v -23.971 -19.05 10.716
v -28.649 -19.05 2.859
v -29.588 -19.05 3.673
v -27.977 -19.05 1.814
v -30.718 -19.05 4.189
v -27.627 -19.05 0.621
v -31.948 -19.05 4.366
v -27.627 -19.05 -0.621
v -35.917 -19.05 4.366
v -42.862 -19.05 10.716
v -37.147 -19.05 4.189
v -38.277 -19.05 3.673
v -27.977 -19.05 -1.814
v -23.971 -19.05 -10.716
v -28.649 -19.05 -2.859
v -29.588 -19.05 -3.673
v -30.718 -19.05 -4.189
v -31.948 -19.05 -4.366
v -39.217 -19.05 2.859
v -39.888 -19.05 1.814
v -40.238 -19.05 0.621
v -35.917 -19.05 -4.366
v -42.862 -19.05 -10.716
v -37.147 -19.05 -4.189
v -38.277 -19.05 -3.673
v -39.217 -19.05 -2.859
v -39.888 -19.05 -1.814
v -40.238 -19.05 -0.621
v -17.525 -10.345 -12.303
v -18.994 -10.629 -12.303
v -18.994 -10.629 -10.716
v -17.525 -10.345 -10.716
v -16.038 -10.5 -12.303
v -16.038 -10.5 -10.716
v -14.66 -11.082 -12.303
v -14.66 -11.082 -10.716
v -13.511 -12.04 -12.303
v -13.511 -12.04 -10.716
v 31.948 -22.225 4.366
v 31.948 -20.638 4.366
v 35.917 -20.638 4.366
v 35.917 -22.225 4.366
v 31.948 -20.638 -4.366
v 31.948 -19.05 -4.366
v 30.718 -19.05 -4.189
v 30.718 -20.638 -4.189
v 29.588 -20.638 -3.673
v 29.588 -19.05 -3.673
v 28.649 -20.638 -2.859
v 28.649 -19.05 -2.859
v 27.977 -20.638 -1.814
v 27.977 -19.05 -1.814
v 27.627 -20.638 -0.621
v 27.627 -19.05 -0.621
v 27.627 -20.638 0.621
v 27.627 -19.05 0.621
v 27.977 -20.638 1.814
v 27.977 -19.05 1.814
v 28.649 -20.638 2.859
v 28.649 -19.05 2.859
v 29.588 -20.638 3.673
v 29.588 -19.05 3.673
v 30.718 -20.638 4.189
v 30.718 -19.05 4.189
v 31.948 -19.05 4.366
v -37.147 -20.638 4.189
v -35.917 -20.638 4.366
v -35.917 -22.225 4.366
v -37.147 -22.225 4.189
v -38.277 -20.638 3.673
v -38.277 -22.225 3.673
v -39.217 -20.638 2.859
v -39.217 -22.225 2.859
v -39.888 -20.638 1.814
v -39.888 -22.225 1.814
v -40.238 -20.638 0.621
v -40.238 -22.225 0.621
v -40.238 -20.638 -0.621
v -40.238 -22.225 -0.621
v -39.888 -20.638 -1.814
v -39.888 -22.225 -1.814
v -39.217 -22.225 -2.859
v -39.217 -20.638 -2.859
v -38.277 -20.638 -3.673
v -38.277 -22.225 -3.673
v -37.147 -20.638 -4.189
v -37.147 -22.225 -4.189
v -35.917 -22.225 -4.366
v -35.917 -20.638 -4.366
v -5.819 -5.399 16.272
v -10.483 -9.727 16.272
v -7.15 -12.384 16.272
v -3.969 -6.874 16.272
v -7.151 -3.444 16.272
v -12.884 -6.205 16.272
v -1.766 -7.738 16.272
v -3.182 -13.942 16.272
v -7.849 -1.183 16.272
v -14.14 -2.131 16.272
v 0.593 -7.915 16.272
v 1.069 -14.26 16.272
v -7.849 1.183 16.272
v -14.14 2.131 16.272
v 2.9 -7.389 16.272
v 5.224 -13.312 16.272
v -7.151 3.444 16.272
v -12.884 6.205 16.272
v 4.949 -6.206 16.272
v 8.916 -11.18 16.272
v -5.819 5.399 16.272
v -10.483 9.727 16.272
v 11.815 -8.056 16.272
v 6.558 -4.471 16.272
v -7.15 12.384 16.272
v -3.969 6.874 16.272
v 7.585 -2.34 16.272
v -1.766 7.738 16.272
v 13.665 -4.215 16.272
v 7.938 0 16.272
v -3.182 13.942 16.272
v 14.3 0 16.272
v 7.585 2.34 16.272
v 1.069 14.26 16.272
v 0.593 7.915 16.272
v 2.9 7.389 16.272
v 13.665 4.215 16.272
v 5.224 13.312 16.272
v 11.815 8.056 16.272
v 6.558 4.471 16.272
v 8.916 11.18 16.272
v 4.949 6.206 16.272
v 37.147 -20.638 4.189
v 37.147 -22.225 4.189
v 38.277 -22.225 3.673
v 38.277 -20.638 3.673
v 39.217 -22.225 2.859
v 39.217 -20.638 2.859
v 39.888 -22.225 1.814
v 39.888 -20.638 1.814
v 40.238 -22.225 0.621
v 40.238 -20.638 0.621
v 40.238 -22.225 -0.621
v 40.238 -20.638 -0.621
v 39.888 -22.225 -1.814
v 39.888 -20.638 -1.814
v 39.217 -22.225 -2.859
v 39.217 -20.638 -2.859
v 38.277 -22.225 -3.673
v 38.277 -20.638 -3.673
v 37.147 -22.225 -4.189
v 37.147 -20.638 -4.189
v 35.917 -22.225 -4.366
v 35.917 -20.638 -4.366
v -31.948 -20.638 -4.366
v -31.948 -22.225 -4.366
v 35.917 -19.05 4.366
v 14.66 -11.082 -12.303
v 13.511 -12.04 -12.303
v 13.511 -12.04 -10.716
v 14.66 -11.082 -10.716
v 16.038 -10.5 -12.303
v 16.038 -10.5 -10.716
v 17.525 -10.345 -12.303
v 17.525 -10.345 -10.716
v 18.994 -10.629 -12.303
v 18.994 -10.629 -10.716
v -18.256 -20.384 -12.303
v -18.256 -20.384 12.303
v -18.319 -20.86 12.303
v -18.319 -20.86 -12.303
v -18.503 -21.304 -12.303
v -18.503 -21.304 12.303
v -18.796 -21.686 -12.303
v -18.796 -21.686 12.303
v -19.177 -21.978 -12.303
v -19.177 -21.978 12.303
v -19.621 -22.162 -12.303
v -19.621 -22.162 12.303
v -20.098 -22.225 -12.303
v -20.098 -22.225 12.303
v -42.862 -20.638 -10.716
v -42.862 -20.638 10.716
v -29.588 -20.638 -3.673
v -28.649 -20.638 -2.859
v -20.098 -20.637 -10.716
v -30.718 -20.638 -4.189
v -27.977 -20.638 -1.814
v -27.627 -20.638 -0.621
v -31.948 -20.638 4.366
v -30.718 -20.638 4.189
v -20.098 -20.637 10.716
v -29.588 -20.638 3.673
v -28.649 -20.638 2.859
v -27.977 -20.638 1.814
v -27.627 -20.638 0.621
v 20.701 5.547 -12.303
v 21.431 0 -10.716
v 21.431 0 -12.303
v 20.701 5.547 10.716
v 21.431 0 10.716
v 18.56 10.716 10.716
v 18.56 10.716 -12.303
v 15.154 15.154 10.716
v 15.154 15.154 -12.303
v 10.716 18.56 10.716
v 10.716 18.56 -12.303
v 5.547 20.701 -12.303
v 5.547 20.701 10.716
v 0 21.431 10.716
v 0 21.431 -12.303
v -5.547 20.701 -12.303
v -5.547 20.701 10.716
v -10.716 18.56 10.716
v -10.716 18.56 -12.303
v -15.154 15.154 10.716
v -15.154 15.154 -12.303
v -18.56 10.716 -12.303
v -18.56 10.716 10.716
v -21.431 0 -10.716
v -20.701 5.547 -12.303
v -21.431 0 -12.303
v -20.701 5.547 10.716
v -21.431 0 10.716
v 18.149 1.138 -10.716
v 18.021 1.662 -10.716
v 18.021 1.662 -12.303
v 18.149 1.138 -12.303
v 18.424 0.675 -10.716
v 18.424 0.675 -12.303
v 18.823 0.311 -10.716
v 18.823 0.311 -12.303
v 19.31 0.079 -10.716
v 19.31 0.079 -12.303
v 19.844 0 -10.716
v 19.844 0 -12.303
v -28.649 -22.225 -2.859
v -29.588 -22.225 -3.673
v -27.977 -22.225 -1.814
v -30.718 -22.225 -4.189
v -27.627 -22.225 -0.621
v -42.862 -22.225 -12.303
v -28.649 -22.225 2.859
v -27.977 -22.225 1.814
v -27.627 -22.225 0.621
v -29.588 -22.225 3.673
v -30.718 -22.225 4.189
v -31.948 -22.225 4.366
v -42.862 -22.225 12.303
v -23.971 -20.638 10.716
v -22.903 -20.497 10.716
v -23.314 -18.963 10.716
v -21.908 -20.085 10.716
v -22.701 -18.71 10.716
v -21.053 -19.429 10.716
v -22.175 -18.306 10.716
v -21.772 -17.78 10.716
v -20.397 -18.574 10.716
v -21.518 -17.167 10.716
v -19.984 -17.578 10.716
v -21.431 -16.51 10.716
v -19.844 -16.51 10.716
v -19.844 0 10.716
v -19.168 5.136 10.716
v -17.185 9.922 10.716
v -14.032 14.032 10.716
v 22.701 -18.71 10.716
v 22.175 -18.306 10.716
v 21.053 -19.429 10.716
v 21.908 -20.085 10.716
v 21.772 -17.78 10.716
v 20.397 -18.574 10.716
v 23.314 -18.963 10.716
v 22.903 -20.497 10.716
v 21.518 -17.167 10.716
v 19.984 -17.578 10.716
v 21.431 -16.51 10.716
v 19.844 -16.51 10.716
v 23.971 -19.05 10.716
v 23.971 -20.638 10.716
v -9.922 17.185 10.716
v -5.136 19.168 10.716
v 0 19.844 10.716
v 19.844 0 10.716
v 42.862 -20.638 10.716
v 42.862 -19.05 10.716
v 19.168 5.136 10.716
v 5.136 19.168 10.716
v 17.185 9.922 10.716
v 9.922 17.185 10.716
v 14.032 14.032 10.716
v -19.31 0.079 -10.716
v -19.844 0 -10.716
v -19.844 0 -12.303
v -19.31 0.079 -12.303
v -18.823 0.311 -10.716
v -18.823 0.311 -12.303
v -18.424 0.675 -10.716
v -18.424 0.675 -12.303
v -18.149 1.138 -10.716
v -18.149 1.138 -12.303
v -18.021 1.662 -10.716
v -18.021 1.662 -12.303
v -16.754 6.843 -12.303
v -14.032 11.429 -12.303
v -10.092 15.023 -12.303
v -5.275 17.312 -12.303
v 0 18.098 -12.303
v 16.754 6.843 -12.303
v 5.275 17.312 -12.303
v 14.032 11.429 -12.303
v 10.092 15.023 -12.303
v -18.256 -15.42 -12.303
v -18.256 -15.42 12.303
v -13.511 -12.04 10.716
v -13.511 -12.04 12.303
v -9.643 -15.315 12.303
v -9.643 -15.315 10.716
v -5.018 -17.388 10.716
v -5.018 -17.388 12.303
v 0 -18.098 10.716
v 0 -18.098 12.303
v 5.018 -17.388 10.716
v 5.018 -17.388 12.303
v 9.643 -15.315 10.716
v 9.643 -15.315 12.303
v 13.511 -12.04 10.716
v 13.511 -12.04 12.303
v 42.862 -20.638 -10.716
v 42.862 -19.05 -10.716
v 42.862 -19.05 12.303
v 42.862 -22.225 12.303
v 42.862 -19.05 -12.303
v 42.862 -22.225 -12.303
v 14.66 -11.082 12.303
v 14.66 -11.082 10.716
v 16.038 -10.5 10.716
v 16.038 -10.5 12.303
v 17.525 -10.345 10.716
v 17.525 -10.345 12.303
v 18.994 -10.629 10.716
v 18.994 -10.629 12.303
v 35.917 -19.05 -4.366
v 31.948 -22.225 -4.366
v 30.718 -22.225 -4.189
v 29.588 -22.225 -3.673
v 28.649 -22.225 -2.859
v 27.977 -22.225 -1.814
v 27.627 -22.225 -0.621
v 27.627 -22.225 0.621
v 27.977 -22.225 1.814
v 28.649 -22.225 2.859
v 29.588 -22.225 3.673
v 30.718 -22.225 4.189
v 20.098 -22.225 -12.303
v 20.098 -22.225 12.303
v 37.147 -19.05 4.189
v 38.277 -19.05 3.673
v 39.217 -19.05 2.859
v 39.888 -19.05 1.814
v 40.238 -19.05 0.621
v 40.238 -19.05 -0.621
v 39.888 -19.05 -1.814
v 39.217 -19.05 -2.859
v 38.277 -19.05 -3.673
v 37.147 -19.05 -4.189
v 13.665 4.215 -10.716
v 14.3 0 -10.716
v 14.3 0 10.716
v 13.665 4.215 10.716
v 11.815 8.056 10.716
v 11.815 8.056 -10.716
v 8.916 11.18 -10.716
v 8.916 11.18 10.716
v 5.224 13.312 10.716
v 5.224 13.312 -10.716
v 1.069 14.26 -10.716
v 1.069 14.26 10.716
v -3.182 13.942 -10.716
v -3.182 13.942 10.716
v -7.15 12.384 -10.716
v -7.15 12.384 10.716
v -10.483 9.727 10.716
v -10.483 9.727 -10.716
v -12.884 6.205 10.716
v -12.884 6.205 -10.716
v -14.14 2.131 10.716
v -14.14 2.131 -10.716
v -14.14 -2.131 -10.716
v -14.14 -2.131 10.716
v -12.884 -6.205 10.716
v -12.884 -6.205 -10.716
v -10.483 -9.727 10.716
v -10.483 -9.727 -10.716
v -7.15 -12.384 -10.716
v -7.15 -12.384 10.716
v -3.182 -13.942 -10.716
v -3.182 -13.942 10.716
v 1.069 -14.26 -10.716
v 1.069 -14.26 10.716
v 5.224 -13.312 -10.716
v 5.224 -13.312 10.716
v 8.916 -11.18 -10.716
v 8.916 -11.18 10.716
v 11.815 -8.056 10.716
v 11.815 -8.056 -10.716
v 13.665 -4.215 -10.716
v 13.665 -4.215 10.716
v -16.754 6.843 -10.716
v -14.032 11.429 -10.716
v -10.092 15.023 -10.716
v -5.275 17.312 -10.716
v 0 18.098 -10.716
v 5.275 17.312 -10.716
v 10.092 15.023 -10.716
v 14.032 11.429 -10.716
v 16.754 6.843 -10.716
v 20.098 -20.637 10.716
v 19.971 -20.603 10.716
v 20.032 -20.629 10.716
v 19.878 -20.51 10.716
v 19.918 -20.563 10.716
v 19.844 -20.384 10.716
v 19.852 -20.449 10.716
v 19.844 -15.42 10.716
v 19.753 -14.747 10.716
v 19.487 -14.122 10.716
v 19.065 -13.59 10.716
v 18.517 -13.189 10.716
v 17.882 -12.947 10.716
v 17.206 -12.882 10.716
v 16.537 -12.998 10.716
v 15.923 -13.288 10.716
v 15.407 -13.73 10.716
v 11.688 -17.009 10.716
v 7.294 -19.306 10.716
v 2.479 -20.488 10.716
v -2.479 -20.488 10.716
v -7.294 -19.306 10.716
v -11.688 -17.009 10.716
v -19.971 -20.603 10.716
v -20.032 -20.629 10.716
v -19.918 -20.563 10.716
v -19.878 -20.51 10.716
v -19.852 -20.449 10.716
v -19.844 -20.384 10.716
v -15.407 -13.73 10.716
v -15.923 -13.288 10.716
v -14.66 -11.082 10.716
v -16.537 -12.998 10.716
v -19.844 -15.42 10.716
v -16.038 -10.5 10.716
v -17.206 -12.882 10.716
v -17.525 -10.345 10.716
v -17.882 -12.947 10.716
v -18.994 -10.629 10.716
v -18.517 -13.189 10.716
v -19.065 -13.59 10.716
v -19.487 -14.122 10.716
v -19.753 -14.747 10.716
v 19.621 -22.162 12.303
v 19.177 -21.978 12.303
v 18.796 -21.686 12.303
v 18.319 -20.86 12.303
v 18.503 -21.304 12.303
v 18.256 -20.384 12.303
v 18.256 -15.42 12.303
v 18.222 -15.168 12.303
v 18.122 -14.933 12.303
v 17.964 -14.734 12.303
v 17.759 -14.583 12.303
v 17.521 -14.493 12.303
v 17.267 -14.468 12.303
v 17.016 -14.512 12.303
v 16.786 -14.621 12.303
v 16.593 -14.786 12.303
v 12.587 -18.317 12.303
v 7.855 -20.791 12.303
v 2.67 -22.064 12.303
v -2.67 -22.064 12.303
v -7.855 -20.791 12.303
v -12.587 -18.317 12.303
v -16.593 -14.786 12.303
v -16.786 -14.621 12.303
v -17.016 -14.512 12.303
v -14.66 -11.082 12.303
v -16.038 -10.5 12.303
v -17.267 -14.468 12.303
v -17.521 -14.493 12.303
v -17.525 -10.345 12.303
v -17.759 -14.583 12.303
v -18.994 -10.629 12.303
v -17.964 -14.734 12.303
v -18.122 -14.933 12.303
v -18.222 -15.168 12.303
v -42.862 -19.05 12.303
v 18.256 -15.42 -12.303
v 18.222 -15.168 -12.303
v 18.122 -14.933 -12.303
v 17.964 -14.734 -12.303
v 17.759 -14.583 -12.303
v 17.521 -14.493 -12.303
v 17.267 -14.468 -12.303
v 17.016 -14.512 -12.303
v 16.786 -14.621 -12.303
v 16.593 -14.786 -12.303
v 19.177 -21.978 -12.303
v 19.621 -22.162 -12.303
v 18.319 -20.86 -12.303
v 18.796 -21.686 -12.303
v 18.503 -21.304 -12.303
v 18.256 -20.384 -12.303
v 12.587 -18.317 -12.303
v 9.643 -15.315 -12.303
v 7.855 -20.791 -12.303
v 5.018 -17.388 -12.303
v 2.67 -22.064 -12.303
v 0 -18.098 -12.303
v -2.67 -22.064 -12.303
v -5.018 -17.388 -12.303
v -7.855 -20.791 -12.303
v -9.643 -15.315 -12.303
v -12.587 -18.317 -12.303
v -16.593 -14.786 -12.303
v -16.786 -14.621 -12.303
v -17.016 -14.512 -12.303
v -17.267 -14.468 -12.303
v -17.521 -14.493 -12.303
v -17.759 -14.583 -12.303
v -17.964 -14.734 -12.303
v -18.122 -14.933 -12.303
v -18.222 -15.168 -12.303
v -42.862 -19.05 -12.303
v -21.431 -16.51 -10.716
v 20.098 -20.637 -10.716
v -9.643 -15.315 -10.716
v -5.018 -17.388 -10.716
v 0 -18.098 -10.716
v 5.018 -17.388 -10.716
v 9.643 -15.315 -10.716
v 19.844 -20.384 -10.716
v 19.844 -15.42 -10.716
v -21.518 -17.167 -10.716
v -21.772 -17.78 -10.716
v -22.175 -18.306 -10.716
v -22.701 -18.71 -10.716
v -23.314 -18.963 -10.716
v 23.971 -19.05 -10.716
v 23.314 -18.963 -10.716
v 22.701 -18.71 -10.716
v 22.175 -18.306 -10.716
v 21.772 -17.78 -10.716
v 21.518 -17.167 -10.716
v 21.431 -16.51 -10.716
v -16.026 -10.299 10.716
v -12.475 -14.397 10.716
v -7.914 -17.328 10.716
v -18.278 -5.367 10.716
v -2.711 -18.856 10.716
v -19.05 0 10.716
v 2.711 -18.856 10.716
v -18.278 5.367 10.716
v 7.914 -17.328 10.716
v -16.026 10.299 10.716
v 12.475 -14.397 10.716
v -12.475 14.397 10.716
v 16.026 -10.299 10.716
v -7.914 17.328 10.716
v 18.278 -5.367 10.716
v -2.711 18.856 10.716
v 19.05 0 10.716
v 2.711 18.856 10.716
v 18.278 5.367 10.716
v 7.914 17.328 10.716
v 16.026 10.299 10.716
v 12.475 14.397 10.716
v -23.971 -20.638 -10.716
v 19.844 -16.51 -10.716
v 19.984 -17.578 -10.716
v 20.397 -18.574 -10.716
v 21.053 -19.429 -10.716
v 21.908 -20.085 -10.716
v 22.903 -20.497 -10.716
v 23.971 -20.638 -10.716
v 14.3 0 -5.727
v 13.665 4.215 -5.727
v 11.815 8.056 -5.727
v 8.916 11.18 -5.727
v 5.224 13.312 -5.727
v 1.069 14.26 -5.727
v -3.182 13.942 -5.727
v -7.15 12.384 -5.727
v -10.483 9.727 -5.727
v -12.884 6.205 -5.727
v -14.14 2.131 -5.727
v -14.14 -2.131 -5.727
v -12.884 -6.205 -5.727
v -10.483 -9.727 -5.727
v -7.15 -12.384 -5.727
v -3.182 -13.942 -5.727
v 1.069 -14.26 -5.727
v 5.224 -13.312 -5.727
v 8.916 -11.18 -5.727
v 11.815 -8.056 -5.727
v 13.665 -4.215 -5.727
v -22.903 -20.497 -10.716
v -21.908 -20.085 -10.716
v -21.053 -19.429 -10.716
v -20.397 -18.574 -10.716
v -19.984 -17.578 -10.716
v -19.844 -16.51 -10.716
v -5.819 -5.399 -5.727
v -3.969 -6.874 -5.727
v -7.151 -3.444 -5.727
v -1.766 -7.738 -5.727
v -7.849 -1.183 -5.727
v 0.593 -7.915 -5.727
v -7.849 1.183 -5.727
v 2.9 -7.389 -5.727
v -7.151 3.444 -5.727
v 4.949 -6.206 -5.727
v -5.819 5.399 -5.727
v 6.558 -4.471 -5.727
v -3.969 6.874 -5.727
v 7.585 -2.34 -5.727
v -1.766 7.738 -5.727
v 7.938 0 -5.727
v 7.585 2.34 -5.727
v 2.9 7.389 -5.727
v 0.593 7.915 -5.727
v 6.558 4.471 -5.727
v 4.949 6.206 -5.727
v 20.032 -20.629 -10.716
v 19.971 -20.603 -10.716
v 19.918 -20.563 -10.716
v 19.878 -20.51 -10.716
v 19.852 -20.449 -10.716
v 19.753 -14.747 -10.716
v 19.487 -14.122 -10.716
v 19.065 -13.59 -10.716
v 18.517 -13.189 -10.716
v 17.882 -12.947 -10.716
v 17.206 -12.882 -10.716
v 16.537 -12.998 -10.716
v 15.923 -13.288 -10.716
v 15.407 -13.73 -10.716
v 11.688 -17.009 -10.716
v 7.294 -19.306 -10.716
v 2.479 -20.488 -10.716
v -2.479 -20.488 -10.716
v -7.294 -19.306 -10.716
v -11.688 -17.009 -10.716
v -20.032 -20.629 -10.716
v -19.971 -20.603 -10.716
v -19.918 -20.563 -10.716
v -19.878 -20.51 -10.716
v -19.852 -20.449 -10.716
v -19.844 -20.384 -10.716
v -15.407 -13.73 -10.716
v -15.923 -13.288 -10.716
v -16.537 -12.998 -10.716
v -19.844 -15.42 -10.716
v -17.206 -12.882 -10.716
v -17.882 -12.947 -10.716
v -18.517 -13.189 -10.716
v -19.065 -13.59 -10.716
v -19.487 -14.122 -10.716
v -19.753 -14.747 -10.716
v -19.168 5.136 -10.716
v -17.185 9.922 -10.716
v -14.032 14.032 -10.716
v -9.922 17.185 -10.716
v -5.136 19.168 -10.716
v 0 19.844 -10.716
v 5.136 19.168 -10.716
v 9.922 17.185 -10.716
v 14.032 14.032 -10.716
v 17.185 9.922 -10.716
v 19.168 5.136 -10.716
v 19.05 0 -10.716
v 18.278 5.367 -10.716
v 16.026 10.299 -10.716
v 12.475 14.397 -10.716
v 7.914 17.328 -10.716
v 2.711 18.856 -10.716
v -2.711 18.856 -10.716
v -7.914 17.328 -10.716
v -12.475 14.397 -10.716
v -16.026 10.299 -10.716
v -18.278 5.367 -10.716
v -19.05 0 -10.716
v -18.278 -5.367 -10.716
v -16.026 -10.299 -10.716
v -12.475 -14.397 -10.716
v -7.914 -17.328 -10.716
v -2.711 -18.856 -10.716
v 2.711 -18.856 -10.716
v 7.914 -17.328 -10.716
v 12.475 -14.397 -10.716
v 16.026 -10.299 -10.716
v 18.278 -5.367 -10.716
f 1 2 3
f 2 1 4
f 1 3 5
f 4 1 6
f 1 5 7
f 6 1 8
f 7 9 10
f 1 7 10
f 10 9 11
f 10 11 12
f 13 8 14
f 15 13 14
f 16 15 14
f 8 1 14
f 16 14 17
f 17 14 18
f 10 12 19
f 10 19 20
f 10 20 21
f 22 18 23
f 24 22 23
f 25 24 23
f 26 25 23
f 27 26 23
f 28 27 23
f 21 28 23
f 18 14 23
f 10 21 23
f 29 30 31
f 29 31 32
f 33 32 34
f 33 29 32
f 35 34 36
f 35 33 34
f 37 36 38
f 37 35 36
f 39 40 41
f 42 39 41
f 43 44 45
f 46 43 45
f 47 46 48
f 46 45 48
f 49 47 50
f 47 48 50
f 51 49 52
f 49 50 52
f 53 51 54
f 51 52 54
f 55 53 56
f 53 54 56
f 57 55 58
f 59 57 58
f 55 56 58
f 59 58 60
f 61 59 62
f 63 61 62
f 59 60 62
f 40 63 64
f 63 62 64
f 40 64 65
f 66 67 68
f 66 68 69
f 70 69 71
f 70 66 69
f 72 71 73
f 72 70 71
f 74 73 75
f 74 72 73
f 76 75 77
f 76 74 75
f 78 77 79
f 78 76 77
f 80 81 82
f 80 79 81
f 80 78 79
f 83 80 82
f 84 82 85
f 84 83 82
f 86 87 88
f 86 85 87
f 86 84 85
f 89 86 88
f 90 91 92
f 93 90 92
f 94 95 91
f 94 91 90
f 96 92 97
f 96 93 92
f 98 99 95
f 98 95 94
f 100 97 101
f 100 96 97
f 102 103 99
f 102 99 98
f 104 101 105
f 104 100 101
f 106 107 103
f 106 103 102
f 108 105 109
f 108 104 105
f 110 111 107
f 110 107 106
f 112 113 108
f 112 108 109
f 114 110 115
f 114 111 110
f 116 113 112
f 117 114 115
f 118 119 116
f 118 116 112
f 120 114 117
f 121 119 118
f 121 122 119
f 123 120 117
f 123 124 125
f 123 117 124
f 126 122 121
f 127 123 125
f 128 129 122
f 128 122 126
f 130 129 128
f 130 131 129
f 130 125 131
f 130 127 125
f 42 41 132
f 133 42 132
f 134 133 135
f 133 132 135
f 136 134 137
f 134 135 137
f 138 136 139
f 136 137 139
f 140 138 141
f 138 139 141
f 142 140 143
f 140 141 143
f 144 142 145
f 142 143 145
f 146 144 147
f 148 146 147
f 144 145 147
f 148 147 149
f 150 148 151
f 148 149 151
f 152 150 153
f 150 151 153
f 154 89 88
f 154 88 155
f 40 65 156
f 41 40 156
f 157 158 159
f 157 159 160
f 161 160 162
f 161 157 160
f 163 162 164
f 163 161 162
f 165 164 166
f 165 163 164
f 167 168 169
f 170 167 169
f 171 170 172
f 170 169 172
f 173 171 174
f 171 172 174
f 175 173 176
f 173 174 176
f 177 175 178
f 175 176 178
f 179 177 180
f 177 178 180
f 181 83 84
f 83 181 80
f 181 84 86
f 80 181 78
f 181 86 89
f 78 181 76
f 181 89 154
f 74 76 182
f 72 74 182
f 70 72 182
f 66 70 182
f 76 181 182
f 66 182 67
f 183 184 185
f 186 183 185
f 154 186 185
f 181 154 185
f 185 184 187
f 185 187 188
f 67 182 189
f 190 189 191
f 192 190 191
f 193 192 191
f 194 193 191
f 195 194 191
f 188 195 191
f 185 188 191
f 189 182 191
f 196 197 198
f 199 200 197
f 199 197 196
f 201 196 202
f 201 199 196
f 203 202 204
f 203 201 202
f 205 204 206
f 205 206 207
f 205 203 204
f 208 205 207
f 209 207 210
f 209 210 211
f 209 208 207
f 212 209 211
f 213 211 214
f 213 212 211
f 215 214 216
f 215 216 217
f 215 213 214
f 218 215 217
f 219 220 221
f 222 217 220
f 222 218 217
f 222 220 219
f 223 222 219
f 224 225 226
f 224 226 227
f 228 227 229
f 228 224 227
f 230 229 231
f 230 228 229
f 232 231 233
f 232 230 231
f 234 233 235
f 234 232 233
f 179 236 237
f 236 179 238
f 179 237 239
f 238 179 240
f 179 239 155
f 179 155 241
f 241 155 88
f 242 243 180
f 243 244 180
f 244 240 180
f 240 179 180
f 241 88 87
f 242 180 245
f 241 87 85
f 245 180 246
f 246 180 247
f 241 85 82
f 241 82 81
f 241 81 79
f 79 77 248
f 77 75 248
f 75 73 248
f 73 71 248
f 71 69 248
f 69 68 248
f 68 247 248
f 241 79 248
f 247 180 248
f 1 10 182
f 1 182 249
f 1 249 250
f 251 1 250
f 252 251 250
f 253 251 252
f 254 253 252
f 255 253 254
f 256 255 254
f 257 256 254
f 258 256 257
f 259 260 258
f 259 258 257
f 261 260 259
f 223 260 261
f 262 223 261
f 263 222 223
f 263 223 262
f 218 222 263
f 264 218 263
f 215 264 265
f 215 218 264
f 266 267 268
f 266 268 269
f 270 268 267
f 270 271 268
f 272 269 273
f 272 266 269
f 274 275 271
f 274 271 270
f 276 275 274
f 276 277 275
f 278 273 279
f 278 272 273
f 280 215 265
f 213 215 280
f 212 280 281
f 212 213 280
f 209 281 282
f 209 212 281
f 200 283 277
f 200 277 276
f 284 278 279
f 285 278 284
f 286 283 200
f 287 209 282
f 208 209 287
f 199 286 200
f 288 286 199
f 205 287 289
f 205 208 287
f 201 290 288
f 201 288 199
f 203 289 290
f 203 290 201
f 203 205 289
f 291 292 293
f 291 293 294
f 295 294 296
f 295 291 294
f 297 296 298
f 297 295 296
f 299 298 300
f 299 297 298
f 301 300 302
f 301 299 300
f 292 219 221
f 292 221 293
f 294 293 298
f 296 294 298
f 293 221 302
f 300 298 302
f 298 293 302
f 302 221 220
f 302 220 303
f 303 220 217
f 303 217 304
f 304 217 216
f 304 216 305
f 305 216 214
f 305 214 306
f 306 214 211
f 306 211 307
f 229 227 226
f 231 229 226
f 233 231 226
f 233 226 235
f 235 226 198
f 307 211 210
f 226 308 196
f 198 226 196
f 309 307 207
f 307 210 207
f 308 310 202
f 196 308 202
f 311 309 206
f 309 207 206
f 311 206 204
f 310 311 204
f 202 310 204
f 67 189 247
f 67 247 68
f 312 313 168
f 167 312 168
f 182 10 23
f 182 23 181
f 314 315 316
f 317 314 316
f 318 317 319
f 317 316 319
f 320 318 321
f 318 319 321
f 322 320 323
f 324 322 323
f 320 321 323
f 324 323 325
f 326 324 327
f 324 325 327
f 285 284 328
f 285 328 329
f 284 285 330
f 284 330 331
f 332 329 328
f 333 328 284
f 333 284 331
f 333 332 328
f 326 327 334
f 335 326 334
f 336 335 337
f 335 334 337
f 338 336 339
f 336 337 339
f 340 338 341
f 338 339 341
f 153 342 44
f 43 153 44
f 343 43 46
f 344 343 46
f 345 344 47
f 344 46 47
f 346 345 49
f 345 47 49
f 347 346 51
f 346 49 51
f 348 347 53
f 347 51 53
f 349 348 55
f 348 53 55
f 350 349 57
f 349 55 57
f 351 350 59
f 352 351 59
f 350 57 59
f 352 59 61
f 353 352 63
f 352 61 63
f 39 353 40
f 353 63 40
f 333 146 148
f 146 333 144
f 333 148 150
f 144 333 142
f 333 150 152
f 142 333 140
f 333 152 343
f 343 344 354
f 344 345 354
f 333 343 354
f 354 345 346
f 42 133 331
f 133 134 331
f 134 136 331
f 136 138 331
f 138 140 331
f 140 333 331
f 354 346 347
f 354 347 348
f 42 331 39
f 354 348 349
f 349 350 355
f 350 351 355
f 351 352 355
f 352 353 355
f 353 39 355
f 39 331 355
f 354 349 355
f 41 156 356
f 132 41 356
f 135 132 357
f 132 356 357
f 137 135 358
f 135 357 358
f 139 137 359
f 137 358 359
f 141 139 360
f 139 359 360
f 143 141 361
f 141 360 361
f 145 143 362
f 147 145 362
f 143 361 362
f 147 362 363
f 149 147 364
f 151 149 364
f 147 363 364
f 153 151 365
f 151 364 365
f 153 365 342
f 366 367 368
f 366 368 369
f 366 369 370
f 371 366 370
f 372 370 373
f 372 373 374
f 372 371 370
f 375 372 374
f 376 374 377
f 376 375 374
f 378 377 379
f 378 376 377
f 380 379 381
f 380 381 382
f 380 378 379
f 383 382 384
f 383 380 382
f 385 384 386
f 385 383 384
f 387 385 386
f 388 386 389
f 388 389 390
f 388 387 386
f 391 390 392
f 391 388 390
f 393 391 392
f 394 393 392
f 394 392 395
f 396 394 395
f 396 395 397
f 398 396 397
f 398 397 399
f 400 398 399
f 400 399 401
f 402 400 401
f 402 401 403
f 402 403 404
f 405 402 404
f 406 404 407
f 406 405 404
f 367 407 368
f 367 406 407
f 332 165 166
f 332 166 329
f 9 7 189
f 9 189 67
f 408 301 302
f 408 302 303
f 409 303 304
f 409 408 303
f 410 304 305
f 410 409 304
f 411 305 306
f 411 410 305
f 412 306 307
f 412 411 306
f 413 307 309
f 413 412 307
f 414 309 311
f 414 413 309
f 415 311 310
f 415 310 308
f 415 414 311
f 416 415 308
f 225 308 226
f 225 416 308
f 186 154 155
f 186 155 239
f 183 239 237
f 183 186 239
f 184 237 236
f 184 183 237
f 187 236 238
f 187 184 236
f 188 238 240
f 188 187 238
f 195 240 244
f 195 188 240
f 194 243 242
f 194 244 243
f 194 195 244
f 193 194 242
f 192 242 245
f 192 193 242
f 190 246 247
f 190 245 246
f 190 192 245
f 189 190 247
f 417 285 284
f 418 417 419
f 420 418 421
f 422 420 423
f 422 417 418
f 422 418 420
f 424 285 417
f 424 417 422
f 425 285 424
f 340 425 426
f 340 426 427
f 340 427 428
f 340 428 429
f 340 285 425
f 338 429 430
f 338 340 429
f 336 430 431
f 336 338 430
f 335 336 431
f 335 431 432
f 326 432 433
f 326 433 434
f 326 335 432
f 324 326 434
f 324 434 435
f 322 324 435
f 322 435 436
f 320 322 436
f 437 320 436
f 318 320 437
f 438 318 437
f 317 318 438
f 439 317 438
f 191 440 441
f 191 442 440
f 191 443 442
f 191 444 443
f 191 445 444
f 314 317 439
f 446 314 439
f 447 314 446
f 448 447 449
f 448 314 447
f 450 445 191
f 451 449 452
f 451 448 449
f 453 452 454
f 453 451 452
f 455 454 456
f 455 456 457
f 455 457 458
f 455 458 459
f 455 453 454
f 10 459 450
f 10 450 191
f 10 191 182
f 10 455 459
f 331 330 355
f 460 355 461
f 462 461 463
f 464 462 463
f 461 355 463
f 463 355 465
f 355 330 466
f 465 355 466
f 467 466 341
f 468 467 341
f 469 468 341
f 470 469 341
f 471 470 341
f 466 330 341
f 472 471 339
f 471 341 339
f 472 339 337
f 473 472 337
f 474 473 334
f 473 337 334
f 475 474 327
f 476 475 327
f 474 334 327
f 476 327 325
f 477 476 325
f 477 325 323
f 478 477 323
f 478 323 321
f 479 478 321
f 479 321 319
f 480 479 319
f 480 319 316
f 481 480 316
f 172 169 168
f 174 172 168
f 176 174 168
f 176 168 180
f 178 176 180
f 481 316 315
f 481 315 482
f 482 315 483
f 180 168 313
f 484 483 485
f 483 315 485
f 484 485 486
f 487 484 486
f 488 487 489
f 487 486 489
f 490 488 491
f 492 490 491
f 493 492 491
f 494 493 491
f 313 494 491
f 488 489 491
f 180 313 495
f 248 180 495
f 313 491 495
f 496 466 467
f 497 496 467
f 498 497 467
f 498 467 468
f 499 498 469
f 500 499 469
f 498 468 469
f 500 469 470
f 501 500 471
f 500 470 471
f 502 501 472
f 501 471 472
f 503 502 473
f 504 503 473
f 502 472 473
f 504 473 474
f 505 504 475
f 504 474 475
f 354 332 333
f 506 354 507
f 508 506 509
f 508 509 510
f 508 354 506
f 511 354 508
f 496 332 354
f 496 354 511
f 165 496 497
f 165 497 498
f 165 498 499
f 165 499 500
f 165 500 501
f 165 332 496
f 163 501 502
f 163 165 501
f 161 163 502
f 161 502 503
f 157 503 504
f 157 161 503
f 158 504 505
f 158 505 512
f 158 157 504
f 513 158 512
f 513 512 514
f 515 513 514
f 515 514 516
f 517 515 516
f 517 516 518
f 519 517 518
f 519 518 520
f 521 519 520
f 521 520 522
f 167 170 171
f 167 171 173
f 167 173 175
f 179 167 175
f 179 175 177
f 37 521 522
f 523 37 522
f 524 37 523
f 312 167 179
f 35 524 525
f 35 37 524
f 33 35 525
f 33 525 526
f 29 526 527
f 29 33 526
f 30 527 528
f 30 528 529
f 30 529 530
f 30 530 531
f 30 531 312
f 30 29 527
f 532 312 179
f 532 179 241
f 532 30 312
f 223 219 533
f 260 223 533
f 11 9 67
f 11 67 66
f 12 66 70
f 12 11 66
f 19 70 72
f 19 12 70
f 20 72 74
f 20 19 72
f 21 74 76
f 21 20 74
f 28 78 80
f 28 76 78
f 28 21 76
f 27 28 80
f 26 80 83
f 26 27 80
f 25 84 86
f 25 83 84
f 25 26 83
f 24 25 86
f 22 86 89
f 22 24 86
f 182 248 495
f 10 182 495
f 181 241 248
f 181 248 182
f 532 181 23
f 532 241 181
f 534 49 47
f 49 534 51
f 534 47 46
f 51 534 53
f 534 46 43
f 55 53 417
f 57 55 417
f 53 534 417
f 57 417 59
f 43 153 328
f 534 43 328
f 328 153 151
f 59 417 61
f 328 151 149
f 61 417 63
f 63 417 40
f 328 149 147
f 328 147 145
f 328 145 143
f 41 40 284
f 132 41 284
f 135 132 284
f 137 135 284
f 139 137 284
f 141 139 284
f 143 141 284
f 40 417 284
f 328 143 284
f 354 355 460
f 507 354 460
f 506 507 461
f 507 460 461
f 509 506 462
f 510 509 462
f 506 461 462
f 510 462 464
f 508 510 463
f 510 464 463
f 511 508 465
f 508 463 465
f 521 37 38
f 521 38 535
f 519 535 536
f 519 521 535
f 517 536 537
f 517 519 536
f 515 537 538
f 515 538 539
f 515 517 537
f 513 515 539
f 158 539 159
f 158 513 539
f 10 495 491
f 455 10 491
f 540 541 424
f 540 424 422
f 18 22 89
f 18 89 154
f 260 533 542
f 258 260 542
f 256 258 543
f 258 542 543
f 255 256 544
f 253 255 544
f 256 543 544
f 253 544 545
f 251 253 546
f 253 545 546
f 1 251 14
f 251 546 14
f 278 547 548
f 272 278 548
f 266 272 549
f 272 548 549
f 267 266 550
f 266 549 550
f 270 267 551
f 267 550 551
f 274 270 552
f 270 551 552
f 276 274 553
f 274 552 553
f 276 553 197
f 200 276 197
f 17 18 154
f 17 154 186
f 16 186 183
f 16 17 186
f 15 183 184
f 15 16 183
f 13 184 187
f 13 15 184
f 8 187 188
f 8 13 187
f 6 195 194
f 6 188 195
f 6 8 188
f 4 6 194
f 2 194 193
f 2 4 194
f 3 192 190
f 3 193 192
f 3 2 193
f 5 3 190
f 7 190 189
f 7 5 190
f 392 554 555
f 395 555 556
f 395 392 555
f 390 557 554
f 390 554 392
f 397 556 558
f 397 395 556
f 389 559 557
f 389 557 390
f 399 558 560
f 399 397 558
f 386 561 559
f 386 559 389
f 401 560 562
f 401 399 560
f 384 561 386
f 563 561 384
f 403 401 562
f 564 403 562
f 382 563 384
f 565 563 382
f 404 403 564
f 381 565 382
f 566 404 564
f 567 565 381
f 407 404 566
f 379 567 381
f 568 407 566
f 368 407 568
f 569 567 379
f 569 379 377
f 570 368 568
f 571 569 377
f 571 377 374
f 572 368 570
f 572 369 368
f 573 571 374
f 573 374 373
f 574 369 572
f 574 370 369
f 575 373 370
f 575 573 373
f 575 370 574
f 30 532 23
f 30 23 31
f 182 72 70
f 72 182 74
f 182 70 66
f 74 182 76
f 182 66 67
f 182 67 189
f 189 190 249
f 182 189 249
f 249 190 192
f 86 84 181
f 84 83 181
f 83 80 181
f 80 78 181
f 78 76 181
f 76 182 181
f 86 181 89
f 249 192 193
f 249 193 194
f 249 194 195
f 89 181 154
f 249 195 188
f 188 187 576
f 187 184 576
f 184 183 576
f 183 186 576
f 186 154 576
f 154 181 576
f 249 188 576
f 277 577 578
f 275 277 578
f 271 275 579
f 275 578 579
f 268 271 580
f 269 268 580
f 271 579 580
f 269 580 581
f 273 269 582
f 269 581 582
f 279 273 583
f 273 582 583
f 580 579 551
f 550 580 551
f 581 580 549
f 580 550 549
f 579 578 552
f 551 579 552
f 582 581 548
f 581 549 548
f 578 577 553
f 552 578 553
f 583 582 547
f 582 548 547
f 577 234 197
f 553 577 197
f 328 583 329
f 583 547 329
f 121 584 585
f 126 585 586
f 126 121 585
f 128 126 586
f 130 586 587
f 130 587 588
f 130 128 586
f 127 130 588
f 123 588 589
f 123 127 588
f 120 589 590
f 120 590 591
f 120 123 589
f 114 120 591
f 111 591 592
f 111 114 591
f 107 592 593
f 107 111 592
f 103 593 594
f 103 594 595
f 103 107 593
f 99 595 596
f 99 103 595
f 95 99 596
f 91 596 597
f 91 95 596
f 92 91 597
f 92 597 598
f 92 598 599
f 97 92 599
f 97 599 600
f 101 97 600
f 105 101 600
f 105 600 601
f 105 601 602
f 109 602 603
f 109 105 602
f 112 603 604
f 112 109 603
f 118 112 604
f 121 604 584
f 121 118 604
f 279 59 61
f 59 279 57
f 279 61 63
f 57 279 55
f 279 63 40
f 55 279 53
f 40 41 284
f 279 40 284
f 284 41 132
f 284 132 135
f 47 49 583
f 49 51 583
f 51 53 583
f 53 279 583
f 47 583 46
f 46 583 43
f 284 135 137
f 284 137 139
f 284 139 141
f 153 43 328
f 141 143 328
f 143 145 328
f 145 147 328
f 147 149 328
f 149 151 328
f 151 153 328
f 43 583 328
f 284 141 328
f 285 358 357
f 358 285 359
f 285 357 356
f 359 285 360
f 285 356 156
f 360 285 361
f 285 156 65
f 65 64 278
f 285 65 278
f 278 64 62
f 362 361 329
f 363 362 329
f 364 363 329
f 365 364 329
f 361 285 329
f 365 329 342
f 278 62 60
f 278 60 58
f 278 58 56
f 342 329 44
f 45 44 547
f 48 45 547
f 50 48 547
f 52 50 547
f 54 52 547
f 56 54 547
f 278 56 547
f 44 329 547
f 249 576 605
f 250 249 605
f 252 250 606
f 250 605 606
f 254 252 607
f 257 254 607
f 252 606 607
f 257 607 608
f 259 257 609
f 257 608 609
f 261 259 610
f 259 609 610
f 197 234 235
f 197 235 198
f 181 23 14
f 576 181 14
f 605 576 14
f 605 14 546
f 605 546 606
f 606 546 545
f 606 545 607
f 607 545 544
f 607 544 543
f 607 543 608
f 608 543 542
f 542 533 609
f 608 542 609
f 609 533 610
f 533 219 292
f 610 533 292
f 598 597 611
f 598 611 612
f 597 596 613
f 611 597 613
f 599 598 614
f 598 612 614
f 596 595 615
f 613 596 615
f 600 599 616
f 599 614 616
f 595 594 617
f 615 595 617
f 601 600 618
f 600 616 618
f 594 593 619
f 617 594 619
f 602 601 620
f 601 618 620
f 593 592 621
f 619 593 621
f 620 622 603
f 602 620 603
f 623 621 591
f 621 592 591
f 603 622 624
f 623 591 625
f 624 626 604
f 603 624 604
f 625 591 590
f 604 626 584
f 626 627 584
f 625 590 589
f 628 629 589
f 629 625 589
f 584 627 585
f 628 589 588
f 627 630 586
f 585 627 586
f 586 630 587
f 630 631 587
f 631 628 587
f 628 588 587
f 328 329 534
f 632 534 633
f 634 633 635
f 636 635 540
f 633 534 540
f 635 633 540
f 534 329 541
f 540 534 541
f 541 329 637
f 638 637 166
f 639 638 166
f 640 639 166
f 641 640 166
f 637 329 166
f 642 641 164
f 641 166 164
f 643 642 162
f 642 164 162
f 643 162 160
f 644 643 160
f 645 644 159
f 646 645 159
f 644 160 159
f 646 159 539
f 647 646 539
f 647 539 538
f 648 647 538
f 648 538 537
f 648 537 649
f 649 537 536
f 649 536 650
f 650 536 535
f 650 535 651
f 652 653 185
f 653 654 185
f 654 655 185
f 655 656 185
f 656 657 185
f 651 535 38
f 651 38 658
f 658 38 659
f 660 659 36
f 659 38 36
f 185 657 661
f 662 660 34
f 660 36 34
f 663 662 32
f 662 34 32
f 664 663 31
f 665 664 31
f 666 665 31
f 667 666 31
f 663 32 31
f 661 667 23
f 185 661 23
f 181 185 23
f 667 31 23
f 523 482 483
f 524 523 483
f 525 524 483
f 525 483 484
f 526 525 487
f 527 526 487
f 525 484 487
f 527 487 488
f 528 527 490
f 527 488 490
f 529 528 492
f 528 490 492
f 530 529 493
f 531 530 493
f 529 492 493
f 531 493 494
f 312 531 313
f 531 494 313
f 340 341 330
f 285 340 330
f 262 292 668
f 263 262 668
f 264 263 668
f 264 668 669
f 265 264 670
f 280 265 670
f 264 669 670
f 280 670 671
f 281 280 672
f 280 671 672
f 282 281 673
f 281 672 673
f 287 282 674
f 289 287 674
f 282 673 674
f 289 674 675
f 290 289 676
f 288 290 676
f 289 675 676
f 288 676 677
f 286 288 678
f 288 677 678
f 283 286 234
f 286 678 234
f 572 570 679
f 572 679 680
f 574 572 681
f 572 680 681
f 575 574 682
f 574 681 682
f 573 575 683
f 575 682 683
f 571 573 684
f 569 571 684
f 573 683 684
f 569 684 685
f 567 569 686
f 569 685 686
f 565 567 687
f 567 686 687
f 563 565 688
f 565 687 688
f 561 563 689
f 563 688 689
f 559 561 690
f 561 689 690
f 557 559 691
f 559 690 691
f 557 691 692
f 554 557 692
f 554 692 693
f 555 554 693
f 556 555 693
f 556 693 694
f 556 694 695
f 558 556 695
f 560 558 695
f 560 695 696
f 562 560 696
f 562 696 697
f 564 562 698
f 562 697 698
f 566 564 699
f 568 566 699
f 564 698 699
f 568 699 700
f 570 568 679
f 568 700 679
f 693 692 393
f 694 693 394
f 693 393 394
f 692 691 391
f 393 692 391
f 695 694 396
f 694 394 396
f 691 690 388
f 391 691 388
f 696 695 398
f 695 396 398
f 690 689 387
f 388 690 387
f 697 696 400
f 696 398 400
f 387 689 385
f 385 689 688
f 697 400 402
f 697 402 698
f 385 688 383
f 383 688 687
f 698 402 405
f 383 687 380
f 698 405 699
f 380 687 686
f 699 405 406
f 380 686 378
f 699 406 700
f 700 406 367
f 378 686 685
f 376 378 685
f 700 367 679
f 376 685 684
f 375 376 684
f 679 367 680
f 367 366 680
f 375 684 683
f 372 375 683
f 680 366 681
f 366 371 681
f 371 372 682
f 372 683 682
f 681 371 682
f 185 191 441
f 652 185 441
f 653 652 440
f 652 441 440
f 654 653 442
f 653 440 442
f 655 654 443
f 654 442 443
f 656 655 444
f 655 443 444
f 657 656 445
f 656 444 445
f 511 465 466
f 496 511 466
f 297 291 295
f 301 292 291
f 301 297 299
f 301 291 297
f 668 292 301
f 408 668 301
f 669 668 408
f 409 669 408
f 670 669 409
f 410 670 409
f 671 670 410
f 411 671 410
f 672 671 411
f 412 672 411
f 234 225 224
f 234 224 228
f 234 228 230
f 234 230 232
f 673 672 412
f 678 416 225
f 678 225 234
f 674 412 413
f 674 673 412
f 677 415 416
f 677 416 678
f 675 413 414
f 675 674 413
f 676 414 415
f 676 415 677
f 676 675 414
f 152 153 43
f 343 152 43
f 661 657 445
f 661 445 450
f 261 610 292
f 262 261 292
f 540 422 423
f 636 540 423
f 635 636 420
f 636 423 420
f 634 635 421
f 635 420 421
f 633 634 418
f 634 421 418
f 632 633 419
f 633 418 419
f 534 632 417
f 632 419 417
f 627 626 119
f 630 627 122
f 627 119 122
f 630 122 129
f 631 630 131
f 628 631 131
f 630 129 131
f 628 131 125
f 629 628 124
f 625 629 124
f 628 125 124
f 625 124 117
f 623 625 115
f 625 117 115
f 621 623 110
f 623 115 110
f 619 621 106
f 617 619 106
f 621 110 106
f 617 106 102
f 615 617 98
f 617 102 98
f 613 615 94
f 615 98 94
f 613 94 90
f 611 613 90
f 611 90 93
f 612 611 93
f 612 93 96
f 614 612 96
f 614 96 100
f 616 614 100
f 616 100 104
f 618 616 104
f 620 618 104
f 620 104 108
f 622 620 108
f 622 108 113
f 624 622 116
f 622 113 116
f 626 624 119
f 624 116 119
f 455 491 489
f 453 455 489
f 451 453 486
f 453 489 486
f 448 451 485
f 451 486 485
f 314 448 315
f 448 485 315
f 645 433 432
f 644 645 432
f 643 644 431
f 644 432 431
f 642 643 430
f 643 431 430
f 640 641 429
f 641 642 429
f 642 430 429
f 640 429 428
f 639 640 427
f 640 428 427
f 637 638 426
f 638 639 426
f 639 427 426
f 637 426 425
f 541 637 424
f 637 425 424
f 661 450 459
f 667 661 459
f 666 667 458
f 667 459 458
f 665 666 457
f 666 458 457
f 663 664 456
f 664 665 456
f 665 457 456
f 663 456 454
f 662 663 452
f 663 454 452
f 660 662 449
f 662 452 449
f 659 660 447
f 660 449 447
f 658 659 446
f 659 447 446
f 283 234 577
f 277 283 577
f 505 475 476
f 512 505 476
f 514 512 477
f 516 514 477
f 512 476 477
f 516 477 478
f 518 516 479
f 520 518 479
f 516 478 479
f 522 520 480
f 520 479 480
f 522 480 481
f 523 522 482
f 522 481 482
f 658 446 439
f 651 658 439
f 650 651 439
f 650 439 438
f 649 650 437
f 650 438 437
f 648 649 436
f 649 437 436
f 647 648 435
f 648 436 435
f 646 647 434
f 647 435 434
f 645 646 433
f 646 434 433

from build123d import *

# Parameters (mm, degrees)
EXTRUDE_THIN2_DEPTH  = 12.303125
EXTRUDE1_DEPTH       = 1.5875
EXTRUDE_THIN3_START  = -10.715625
EXTRUDE_THIN3_DEPTH  = 21.43125
EXTRUDE2_DEPTH       = 1.5875
EXTRUDE3_START       = -10.715625
EXTRUDE3_OUTLINE_R   = 19.05
EXTRUDE3_OUTLINE_R_2 = 14.3002
EXTRUDE3_DEPTH       = 21.43125
SKETCH8_R            = 14.3002
SKETCH8_R_2          = 7.9375
EXTRUDE4_DEPTH       = 21.99894
CUT_EXTRUDE1_DEPTH   = 51.950156499


# Read off the part's stored shape, not the designer's step: Extrude-Thin3, Extrude3
with BuildPart() as part:
    # Sketch1 → Extrude-Thin2 (new, symmetric)
    with BuildSketch(Plane.XY):
        with BuildLine():
            Line((-42.8625, -20.6375), (-20.09775, -20.6375))
            ThreePointArc((-20.09775, -20.6375), (-19.918144878, -20.563105122), (-19.84375, -20.3835))
            Line((-19.84375, -20.3835), (-19.84375, -15.420011096))
            ThreePointArc((-19.84375, -15.420011096), (-18.207905551, -13.0463846), (-15.40744863, -13.730146866))
            ThreePointArc((-15.40744863, -13.730146866), (0, -20.6375), (15.40744863, -13.730146866))
            ThreePointArc((15.40744863, -13.730146866), (18.207905551, -13.0463846), (19.84375, -15.420011096))
            Line((19.84375, -15.420011096), (19.84375, -20.3835))
            ThreePointArc((19.84375, -20.3835), (19.918144878, -20.563105122), (20.09775, -20.6375))
            Line((20.09775, -20.6375), (42.8625, -20.6375))
            Line((42.8625, -20.6375), (42.8625, -22.225))
            Line((42.8625, -22.225), (20.09775, -22.225))
            ThreePointArc((20.09775, -22.225), (18.795612862, -21.685637138), (18.25625, -20.3835))
            Line((18.25625, -20.3835), (18.25625, -15.420011096))
            ThreePointArc((18.25625, -15.420011096), (17.642808332, -14.52990116), (16.592636986, -14.786312009))
            ThreePointArc((16.592636986, -14.786312009), (0, -22.225), (-16.592636986, -14.786312009))
            ThreePointArc((-16.592636986, -14.786312009), (-17.642808332, -14.52990116), (-18.25625, -15.420011096))
            Line((-18.25625, -15.420011096), (-18.25625, -20.3835))
            ThreePointArc((-18.25625, -20.3835), (-18.795612862, -21.685637138), (-20.09775, -22.225))
            Line((-20.09775, -22.225), (-42.8625, -22.225))
            Line((-42.8625, -22.225), (-42.8625, -20.6375))
        make_face()
    extrude(amount=EXTRUDE_THIN2_DEPTH, both=True)

    # Sketch4 → Extrude1 (add)
    with BuildSketch(Plane.XY.offset(12.303125)):
        with BuildLine():
            Line((-42.8625, -19.05), (-18.993828558, -10.629391671))
            ThreePointArc((-18.993828558, -10.629391671), (-16.037730525, -10.500296197), (-13.51114726, -12.040282636))
            ThreePointArc((-13.51114726, -12.040282636), (0, -18.0975), (13.51114726, -12.040282636))
            ThreePointArc((13.51114726, -12.040282636), (16.037730525, -10.500296197), (18.993828558, -10.629391671))
            Line((18.993828558, -10.629391671), (42.8625, -19.05))
            Line((42.8625, -19.05), (42.8625, -22.225))
            Line((42.8625, -22.225), (20.09775, -22.225))
            ThreePointArc((20.09775, -22.225), (18.795612862, -21.685637138), (18.25625, -20.3835))
            Line((18.25625, -20.3835), (18.25625, -15.420011096))
            ThreePointArc((18.25625, -15.420011096), (17.642808332, -14.52990116), (16.592636986, -14.786312009))
            ThreePointArc((16.592636986, -14.786312009), (0, -22.225), (-16.592636986, -14.786312009))
            ThreePointArc((-16.592636986, -14.786312009), (-17.642808332, -14.52990116), (-18.25625, -15.420011096))
            Line((-18.25625, -15.420011096), (-18.25625, -20.3835))
            ThreePointArc((-18.25625, -20.3835), (-18.795612862, -21.685637138), (-20.09775, -22.225))
            Line((-20.09775, -22.225), (-42.8625, -22.225))
            Line((-42.8625, -22.225), (-42.8625, -19.05))
        make_face()
    extrude1 = extrude(amount=-EXTRUDE1_DEPTH)

    # Mirror1: Extrude1 across plane
    add(extrude1.mirror(Plane.XY))


with BuildPart() as body_2:
    # Extrude-Thin3 outline → Extrude-Thin3 (new body)
    with BuildSketch(Plane.XY.offset(EXTRUDE_THIN3_START)):
        with BuildLine():
            Line((-23.97125, -19.05), (-42.8625, -19.05))
            Line((-42.8625, -19.05), (-42.8625, -20.6375))
            Line((-42.8625, -20.6375), (-23.97125, -20.6375))
            ThreePointArc((-23.97125, -20.6375), (-21.052666761, -19.428583239), (-19.84375, -16.51))
            Line((-19.84375, -16.51), (-19.84375, 0))
            ThreePointArc((-19.84375, 0), (0, 19.84375), (19.84375, 0))
            Line((19.84375, 0), (19.84375, -16.51))
            ThreePointArc((19.84375, -16.51), (21.052666761, -19.428583239), (23.97125, -20.6375))
            Line((23.97125, -20.6375), (42.8625, -20.6375))
            Line((42.8625, -20.6375), (42.8625, -19.05))
            Line((42.8625, -19.05), (23.97125, -19.05))
            ThreePointArc((23.97125, -19.05), (22.175198776, -18.306051224), (21.43125, -16.51))
            Line((21.43125, -16.51), (21.43125, 0))
            ThreePointArc((21.43125, 0), (0, 21.43125), (-21.43125, 0))
            Line((-21.43125, 0), (-21.43125, -16.51))
            ThreePointArc((-21.43125, -16.51), (-22.175198776, -18.306051224), (-23.97125, -19.05))
        make_face()
    extrude(amount=EXTRUDE_THIN3_DEPTH)

    # Sketch6 → Extrude2 (add)
    with BuildSketch(Plane(origin=(0, 0, -10.715625), x_dir=(-1, 0, 0), z_dir=(0, 0, -1))):
        with BuildLine():
            Line((-19.84375, 0), (-21.43125, 0))
            ThreePointArc((-21.43125, 0), (0, 21.43125), (21.43125, 0))
            Line((21.43125, 0), (19.84375, 0))
            ThreePointArc((19.84375, 0), (18.610270538, 0.477999494), (18.020989833, 1.662357273))
            ThreePointArc((18.020989833, 1.662357273), (0, 18.0975), (-18.020989833, 1.662357273))
            ThreePointArc((-18.020989833, 1.662357273), (-18.610270538, 0.477999494), (-19.84375, 0))
        make_face()
    extrude(amount=EXTRUDE2_DEPTH)


with BuildPart() as body_3:
    # Extrude3 outline → Extrude3 (new body)
    with BuildSketch(Plane.XY.offset(EXTRUDE3_START)):
        Circle(EXTRUDE3_OUTLINE_R)
        Circle(EXTRUDE3_OUTLINE_R_2, mode=Mode.SUBTRACT)
    extrude(amount=EXTRUDE3_DEPTH)


with BuildPart() as body_4:
    # Sketch8 → Extrude4 (new body)
    with BuildSketch(Plane.XY.offset(16.271875)):
        Circle(SKETCH8_R)
        Circle(SKETCH8_R_2, mode=Mode.SUBTRACT)
    extrude(amount=-EXTRUDE4_DEPTH)


with BuildPart() as cut_extrude1_tool:
    # Sketch3 → Cut-Extrude1 (new, through all)
    with BuildSketch(Plane(origin=(0, 0, 0), x_dir=(1, 0, 0), z_dir=(0, 1, 0))):
        with BuildLine():
            Line((-35.9171875, 4.365625), (-31.9484375, 4.365625))
            ThreePointArc((-31.9484375, 4.365625), (-27.5828125, 0), (-31.9484375, -4.365625))
            Line((-31.9484375, -4.365625), (-35.9171875, -4.365625))
            ThreePointArc((-35.9171875, -4.365625), (-40.2828125, 0), (-35.9171875, 4.365625))
        make_face()
        with BuildLine():
            Line((31.9484375, -4.365625), (35.9171875, -4.365625))
            ThreePointArc((35.9171875, -4.365625), (40.2828125, 0), (35.9171875, 4.365625))
            Line((35.9171875, 4.365625), (31.9484375, 4.365625))
            ThreePointArc((31.9484375, 4.365625), (27.5828125, 0), (31.9484375, -4.365625))
        make_face()
    extrude(amount=-CUT_EXTRUDE1_DEPTH)


with BuildPart() as part_1:
    add(part.part)

    # Cut-Extrude1: cut by cut_extrude1_tool
    add(cut_extrude1_tool.part, mode=Mode.SUBTRACT)


with BuildPart() as body_2_1:
    add(body_2.part)

    # Cut-Extrude1: cut by cut_extrude1_tool
    add(cut_extrude1_tool.part, mode=Mode.SUBTRACT)


solid = Compound([body_3.part, body_4.part, part_1.part, body_2_1.part])
